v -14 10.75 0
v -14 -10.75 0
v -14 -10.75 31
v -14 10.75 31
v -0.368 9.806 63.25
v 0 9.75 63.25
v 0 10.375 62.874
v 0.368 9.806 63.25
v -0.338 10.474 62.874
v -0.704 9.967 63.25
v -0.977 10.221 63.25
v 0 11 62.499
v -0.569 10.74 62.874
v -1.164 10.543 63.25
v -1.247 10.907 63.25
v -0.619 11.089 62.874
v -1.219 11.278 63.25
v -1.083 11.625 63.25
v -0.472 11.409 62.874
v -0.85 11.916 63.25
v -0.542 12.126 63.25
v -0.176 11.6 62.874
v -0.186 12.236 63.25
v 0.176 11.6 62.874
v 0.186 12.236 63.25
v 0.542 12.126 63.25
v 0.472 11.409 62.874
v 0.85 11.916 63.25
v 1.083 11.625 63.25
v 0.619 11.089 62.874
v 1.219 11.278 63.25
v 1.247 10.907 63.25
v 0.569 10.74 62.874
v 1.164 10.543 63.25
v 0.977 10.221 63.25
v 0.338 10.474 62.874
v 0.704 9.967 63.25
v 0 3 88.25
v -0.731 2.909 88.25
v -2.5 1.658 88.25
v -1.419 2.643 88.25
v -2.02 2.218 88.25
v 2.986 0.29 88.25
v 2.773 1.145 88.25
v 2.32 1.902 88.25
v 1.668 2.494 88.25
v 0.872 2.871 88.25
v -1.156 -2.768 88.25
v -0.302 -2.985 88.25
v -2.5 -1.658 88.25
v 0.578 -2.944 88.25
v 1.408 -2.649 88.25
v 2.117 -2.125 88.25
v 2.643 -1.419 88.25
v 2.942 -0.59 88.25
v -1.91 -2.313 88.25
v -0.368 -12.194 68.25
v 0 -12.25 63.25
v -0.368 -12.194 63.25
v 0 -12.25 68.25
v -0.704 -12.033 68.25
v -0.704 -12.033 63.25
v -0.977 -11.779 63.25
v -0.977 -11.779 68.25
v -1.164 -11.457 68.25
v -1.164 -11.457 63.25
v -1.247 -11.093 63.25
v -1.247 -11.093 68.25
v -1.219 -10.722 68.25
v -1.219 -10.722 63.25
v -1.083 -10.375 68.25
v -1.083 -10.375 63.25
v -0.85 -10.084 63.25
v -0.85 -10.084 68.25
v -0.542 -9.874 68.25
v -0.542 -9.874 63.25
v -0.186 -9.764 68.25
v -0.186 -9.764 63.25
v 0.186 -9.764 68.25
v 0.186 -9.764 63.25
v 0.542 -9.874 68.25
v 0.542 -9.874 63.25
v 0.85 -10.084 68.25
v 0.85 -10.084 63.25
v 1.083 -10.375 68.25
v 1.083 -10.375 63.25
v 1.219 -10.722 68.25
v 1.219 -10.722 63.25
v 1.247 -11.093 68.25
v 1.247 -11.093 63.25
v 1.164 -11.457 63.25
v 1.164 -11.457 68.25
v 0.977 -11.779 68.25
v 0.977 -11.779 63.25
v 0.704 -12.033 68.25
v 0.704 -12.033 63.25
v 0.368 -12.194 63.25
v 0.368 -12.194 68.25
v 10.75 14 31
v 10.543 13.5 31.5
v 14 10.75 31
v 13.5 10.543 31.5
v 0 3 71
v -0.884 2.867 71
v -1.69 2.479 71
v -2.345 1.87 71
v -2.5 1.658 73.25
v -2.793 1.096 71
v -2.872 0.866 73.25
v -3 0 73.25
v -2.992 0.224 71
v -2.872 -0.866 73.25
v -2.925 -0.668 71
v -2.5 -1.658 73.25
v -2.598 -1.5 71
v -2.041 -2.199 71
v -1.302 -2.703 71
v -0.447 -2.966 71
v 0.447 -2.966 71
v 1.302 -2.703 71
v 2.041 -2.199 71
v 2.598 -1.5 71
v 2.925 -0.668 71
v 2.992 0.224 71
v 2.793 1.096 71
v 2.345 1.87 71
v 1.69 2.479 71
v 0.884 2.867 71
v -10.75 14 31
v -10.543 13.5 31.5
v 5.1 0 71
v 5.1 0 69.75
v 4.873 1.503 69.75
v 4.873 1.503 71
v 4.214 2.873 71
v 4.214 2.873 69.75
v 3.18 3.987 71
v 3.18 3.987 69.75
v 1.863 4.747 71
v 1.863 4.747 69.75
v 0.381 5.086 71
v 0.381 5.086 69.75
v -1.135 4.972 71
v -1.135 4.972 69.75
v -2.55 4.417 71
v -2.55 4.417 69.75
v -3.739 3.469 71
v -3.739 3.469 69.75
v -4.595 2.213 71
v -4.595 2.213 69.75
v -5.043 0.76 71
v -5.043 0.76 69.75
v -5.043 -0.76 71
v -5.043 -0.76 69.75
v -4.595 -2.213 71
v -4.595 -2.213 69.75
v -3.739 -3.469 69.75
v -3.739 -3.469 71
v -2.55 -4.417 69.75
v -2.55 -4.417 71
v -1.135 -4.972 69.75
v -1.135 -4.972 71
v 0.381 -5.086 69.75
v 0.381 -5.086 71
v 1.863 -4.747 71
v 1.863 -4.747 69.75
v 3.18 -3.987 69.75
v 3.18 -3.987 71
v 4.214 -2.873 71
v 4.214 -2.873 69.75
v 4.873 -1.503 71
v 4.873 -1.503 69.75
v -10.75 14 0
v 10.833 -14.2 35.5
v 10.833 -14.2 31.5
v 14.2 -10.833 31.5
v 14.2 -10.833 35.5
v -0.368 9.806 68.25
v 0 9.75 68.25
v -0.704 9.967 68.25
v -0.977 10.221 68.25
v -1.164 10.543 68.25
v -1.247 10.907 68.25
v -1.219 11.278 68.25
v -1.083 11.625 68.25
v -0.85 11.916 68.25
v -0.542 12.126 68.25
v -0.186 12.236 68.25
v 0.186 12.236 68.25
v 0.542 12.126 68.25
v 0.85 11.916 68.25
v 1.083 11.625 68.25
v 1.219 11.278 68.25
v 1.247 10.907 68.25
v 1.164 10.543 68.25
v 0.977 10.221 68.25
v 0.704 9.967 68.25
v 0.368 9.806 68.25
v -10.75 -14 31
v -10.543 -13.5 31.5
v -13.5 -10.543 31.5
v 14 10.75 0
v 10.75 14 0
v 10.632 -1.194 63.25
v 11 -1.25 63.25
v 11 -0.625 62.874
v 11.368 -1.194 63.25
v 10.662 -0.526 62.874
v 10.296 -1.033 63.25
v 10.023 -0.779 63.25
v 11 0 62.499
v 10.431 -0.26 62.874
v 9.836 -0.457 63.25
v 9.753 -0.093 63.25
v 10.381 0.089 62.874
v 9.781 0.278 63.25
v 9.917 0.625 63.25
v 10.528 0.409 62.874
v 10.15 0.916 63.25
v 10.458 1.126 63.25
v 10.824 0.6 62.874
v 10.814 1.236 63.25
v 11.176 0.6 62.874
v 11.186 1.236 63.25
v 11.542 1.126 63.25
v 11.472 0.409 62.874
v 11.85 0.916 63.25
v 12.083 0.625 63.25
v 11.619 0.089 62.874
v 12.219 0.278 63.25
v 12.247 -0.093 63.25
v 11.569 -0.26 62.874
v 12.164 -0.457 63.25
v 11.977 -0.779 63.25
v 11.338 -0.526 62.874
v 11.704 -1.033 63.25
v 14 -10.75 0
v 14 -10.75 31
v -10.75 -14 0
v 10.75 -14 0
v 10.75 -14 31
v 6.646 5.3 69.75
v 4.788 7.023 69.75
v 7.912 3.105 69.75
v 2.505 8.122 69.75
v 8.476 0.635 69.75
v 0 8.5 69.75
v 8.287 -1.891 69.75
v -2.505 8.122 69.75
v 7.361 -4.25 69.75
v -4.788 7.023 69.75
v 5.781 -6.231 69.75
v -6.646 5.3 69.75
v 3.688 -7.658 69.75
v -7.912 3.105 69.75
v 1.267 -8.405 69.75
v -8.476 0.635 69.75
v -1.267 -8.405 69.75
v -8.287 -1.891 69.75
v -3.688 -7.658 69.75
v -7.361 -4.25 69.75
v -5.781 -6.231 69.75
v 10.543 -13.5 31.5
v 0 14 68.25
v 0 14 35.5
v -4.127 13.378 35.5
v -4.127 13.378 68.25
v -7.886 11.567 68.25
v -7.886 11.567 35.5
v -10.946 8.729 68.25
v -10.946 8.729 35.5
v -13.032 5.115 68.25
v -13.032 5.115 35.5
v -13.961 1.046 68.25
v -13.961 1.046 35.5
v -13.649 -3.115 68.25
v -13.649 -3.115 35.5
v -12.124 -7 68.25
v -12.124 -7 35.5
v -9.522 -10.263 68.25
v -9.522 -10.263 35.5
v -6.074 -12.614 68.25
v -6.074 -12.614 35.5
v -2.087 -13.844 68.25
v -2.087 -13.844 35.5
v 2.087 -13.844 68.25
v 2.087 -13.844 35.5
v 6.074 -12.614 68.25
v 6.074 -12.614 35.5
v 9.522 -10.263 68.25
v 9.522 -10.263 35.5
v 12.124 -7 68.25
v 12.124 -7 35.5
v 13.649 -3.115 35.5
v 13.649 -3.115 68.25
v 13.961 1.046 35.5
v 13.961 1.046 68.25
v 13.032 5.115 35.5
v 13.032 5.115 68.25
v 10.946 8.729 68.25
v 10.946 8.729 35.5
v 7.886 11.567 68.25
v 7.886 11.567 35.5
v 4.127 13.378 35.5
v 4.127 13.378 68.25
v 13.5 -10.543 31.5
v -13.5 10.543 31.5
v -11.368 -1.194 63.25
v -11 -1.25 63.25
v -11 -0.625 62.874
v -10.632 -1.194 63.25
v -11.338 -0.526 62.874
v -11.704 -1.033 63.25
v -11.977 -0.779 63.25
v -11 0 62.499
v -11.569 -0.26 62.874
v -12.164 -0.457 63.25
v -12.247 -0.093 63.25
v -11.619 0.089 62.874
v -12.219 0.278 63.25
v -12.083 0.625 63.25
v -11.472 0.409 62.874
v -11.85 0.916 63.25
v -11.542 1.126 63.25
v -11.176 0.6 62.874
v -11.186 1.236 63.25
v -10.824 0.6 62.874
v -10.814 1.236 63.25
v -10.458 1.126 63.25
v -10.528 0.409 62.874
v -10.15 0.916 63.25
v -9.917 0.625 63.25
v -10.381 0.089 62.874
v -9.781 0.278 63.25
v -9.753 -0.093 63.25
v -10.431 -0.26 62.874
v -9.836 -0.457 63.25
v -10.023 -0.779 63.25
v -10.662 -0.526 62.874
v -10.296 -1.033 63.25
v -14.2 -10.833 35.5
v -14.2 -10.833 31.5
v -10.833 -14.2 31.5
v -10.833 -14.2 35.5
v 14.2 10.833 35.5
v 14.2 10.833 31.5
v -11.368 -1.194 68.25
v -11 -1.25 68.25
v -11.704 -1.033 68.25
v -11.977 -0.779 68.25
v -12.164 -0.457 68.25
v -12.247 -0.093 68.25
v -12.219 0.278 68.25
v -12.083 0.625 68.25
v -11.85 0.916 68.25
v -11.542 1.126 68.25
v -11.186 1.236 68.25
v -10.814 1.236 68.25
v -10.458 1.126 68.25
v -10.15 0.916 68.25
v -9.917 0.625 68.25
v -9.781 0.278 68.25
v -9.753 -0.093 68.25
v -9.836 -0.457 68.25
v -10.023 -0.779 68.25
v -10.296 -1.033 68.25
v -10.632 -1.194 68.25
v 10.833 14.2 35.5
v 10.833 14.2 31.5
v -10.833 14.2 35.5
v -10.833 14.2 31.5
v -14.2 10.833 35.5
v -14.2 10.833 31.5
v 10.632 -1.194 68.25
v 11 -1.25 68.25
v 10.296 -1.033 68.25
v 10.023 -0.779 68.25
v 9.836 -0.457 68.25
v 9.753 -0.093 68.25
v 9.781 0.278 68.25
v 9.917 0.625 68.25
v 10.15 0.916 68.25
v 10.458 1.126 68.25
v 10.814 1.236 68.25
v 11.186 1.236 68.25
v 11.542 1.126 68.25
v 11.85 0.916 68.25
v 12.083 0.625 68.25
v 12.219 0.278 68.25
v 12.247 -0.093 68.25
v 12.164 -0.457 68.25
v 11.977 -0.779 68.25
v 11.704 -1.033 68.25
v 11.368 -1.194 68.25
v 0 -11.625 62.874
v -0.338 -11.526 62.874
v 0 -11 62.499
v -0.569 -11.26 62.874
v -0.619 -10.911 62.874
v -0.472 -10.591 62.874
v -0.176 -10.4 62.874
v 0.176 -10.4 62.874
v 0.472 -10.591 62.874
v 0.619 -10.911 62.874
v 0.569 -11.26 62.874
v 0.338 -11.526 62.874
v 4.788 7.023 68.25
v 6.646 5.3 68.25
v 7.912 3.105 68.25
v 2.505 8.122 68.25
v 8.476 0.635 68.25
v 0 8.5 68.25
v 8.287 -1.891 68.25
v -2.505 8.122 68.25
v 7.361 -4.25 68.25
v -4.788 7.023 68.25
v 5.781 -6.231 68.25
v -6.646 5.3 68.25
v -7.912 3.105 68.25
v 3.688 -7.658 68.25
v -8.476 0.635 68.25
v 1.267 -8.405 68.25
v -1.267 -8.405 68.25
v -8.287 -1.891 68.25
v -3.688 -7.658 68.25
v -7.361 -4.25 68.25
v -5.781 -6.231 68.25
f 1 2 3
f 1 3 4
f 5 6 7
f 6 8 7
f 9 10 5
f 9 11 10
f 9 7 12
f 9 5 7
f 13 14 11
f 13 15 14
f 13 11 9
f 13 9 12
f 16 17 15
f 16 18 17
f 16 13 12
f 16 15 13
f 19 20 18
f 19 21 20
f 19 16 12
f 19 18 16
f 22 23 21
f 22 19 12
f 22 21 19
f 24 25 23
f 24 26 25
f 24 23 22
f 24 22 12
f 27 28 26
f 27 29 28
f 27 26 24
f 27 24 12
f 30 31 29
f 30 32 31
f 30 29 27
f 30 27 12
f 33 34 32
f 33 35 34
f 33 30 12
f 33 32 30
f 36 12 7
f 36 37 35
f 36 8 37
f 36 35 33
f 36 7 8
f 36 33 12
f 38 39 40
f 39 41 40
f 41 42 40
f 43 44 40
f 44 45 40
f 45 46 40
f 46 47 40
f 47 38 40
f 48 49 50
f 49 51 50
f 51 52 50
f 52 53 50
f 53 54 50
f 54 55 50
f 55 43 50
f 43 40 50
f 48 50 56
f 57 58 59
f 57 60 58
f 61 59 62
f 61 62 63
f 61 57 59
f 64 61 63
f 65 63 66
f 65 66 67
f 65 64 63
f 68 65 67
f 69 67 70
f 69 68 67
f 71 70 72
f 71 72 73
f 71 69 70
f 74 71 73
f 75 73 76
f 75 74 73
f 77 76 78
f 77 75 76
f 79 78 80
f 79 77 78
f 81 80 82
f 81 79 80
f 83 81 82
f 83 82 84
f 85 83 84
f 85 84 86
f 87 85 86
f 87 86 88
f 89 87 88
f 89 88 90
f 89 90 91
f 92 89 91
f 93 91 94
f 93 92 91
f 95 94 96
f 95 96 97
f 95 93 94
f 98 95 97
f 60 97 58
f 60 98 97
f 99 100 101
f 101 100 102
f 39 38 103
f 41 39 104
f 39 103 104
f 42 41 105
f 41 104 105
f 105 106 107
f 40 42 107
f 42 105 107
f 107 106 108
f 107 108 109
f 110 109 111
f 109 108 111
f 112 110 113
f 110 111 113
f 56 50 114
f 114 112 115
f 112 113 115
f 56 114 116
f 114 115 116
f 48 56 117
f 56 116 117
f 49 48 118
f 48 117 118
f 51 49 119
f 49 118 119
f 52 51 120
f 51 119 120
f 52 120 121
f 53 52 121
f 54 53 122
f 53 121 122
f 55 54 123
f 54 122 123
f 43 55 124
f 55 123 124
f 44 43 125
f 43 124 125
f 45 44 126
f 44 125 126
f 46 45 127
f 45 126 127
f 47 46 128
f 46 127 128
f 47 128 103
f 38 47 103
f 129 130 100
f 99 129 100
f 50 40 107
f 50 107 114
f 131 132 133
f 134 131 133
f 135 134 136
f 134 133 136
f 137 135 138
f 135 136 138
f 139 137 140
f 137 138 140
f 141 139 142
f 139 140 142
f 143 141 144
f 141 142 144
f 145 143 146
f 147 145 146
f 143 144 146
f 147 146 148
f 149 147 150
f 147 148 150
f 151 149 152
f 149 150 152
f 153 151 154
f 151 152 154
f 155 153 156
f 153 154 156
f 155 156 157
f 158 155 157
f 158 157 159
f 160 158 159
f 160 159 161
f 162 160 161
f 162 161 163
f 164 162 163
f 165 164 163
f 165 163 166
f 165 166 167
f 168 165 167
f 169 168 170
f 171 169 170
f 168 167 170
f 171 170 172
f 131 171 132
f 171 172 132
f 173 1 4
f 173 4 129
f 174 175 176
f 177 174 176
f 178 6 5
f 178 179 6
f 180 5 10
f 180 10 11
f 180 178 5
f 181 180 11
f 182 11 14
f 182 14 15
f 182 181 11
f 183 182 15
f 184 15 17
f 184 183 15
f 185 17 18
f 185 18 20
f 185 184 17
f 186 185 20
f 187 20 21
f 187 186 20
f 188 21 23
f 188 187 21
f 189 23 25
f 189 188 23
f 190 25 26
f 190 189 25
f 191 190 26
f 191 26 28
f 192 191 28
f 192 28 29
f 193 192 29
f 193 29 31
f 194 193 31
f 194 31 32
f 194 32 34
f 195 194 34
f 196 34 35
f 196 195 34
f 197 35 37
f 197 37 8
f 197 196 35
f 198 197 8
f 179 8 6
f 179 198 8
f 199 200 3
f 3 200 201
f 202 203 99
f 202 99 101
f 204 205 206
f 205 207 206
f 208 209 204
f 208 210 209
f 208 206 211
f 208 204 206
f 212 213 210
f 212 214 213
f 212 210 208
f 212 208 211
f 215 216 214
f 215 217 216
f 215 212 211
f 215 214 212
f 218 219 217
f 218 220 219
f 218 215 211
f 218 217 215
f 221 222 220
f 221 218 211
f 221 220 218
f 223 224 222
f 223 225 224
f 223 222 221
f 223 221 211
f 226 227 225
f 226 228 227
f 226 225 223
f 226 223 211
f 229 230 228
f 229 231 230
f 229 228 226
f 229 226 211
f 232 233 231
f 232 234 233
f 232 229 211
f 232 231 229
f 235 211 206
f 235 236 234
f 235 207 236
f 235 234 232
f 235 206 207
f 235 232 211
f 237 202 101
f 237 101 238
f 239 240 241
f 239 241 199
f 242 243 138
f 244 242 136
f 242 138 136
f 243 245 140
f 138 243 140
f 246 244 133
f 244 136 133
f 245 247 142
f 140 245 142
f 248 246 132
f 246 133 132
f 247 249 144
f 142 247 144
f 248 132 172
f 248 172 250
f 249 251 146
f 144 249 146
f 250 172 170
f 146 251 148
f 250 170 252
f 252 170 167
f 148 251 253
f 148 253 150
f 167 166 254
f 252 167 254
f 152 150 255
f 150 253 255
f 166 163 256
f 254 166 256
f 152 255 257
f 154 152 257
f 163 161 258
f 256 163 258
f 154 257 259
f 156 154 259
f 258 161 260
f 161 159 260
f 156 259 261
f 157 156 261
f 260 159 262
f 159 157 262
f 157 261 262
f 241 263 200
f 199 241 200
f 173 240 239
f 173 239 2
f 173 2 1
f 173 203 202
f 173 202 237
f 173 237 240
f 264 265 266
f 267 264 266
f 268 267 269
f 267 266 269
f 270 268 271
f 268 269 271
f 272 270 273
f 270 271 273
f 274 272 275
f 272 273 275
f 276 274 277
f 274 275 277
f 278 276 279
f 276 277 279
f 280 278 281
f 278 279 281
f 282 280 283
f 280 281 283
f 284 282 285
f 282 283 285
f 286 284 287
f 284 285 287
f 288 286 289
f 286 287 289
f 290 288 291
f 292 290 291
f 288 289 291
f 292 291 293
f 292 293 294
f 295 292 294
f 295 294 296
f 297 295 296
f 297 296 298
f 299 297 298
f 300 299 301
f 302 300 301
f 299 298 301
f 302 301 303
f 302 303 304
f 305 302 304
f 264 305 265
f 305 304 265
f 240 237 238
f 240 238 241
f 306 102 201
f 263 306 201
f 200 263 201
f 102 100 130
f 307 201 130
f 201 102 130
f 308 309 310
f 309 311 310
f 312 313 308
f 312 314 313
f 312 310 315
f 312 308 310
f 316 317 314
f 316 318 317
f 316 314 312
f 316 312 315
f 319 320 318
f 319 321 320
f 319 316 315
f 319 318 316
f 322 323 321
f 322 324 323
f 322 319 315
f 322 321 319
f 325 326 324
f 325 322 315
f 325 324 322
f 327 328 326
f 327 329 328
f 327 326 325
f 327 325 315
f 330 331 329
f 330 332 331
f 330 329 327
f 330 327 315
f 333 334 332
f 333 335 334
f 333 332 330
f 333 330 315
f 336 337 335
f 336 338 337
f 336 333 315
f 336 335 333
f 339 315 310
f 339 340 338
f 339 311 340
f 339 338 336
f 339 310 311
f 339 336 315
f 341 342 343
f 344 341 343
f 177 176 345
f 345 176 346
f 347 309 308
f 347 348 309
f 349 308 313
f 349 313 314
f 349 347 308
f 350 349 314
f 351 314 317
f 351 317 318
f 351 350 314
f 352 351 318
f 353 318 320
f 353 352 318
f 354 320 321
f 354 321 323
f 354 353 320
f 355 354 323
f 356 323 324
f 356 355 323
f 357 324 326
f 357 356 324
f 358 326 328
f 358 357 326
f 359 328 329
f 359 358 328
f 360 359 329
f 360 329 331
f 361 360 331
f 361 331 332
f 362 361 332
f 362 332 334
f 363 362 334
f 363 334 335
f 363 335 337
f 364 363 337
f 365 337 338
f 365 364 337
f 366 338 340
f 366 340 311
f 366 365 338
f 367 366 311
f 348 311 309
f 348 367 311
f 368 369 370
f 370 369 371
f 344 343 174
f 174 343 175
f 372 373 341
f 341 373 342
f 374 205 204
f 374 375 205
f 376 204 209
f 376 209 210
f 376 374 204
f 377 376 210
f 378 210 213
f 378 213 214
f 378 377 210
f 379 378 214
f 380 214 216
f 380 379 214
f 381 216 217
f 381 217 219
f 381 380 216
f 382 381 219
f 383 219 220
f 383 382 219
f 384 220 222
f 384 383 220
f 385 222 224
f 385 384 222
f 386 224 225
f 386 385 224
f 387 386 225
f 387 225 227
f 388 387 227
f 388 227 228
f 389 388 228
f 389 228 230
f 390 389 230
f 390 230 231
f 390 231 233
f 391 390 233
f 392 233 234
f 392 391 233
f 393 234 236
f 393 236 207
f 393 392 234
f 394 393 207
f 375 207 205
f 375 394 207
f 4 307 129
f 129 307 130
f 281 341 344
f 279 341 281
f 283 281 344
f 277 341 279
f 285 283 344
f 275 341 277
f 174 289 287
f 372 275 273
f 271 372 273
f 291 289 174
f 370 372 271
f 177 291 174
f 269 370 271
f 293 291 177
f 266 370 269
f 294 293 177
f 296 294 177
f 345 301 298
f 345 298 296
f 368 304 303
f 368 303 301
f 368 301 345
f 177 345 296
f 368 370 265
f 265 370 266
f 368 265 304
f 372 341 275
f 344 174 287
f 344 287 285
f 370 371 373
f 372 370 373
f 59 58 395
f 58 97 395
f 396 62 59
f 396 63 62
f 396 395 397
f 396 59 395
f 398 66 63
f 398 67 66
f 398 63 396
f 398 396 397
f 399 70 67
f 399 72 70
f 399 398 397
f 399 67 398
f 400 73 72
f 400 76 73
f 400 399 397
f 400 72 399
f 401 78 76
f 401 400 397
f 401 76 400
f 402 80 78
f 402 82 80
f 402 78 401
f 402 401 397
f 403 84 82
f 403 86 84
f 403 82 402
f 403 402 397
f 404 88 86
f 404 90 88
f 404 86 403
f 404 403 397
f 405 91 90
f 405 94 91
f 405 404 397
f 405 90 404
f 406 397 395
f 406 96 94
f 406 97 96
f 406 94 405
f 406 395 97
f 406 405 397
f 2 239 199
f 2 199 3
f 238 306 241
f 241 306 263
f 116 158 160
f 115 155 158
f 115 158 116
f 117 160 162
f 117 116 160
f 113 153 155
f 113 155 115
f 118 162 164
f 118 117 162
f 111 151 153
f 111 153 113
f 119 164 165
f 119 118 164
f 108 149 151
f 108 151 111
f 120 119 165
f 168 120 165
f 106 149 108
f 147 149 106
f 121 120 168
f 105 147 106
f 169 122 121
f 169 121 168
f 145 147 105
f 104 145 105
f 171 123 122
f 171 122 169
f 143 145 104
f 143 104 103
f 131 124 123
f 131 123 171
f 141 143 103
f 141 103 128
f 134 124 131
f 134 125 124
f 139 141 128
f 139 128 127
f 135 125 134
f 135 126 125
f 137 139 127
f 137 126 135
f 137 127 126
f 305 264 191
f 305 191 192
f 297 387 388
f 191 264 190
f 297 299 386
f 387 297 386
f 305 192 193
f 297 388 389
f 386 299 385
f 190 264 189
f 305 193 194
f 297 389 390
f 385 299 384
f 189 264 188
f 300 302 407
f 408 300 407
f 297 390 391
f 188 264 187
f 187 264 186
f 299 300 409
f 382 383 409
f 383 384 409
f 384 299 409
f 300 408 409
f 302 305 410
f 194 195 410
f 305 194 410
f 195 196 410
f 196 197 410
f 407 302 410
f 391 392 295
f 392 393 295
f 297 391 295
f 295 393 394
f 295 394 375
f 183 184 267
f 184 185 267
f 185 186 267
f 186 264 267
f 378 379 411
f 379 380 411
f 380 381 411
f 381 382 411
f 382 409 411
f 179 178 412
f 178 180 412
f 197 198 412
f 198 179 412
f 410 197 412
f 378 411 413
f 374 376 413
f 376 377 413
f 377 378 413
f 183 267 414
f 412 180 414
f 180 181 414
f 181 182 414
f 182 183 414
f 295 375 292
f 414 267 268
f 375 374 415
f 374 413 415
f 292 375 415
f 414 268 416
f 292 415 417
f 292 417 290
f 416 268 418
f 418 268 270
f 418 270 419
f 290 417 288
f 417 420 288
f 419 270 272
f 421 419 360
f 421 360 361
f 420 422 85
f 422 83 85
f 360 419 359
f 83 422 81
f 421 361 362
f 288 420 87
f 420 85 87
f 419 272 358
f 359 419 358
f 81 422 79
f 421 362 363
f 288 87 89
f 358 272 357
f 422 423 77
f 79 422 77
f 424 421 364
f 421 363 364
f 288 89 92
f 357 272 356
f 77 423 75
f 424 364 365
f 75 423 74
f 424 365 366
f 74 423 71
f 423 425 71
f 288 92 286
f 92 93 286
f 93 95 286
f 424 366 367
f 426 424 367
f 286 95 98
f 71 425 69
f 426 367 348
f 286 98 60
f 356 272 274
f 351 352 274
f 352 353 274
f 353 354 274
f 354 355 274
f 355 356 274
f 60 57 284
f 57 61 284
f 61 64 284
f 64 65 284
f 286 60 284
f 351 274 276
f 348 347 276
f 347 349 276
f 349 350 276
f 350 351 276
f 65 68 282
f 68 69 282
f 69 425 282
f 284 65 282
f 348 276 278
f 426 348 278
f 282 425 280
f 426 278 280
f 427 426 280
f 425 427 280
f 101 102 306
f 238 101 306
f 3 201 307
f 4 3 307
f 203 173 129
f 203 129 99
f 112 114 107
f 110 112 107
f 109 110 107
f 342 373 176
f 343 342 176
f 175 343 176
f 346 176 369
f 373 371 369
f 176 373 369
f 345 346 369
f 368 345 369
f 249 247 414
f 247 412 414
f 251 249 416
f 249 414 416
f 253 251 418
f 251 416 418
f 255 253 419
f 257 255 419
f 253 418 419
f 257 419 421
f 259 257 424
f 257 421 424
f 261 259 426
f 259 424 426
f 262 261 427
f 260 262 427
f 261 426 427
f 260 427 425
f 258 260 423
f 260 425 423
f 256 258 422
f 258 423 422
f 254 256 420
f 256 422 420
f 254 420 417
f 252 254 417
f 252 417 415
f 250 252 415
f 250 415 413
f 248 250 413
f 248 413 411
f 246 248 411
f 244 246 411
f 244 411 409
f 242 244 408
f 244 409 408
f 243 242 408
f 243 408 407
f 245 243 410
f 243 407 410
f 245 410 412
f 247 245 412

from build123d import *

# Parameters (mm, degrees)
BOSS_EXTRUDE1_DEPTH            = 31.5
BOSS_EXTRUDE2_DEPTH            = 4
CHAMFER1_SIZE                  = 0.5
M3X0_5_TAPPED_HOLE1_AT_2_COUNT = 2
M3X0_5_TAPPED_HOLE1_AT_2_PITCH = 15.556349186
M3X0_5_TAPPED_HOLE1_AT_3_COUNT = 2
M3X0_5_TAPPED_HOLE1_AT_3_PITCH = 22
M3X0_5_TAPPED_HOLE1_AT_4_COUNT = 2
M3X0_5_TAPPED_HOLE1_AT_4_PITCH = 15.556349186
SKETCH8_R                      = 5.1
SKETCH8_R_2                    = 3
BOSS_EXTRUDE3_DEPTH            = 1.25
CUT_EXTRUDE1_DEPTH             = 15
MOVE_START                     = 31.5
MOVE_FACE1_DEPTH               = 4


# Read off the part's stored shape, not the designer's step: Move Face1
with BuildPart() as part:
    # Sketch1 → Boss-Extrude1 (new body)
    with BuildSketch(Plane.XY):
        Polygon((10.75, -14), (-10.75, -14), (-14, -10.75), (-14, 10.75), (-10.75, 14), (10.75, 14), (14, 10.75), (14, -10.75), align=None)
    extrude(amount=BOSS_EXTRUDE1_DEPTH)

    # Chamfer1
    chamfer1_edges = [part.edges().sort_by_distance(p)[0] for p in [
        (-12.375, 12.375, 31.5),
        (-14, 0, 31.5),
        (-12.375, -12.375, 31.5),
        (0, -14, 31.5),
        (12.375, -12.375, 31.5),
        (14, 0, 31.5),
        (12.375, 12.375, 31.5),
        (0, 14, 31.5),
    ]]
    chamfer(chamfer1_edges, length=CHAMFER1_SIZE)


with BuildPart() as body_2:
    # Sketch3 → Boss-Extrude2 (new body)
    with BuildSketch(Plane.XY.offset(31.5)):
        Polygon((14, 10.75), (10.75, 14), (-10.75, 14), (-14, 10.75), (-14, -10.75), (-10.75, -14), (10.75, -14), (14, -10.75), align=None)
    extrude(amount=BOSS_EXTRUDE2_DEPTH)

    # Sketch4 → Revolve1 (revolve)
    with BuildSketch(Plane(origin=(0, 0, 0), x_dir=(0, 0, -1), z_dir=(1, 0, 0))):
        Polygon((-88.25, 0), (-88.25, 3), (-69.75, 3), (-69.75, 8.5), (-68.25, 8.5), (-68.25, 14), (-35.5, 14), (-35.5, 0), align=None)
    revolve(axis=Axis((0, 0, 35.5), (0, 0, 1)))

    # Sketch7 → M3x0.5 Tapped Hole1 (revolve, cut)
    with BuildSketch(Plane(origin=(0, 11, 68.25), x_dir=(0, -1, 0), z_dir=(1, 0, 0))):
        Polygon((0, 0), (0, 5.751075774), (1.25, 5), (1.25, 0), align=None)
    m3x0_5_tapped_hole1 = revolve(axis=Axis((0, 11, 74.6), (0, 0, -1)), mode=Mode.SUBTRACT)

    # M3x0.5 Tapped Hole1 at 2: M3x0.5 Tapped Hole1 ×2
    with Locations(*[Vector(0.7071067811865472, -0.7071067811865478, 0) * (i * M3X0_5_TAPPED_HOLE1_AT_2_PITCH) for i in range(1, M3X0_5_TAPPED_HOLE1_AT_2_COUNT)]):
        add(m3x0_5_tapped_hole1, mode=Mode.SUBTRACT)

    # M3x0.5 Tapped Hole1 at 3: M3x0.5 Tapped Hole1 ×2
    with Locations(*[(0, -i * M3X0_5_TAPPED_HOLE1_AT_3_PITCH, 0) for i in range(1, M3X0_5_TAPPED_HOLE1_AT_3_COUNT)]):
        add(m3x0_5_tapped_hole1, mode=Mode.SUBTRACT)

    # M3x0.5 Tapped Hole1 at 4: M3x0.5 Tapped Hole1 ×2
    with Locations(*[Vector(-0.7071067811865472, -0.7071067811865478, 0) * (i * M3X0_5_TAPPED_HOLE1_AT_4_PITCH) for i in range(1, M3X0_5_TAPPED_HOLE1_AT_4_COUNT)]):
        add(m3x0_5_tapped_hole1, mode=Mode.SUBTRACT)

    # Sketch8 → Boss-Extrude3 (add)
    with BuildSketch(Plane.XY.offset(69.75)):
        Circle(SKETCH8_R)
        with Locations(Location((0, 0, 0), (0, 0, 90))):
            Circle(SKETCH8_R_2, mode=Mode.SUBTRACT)
    extrude(amount=BOSS_EXTRUDE3_DEPTH)

    # Sketch9 → Cut-Extrude1 (cut)
    with BuildSketch(Plane.XY.offset(88.25)):
        with BuildLine():
            Line((-2.5, 1.658312395), (-2.5, -1.658312395))
            ThreePointArc((-2.5, -1.658312395), (-3, 0), (-2.5, 1.658312395))
        make_face()
    extrude(amount=-CUT_EXTRUDE1_DEPTH, mode=Mode.SUBTRACT)

    # Move Face1 outline → Move Face1 (add)
    with BuildSketch(Plane.XY.offset(MOVE_START)):
        Polygon((14.2, -10.832842712), (14.2, 10.832842712), (10.832842712, 14.2), (-10.832842712, 14.2), (-14.2, 10.832842712), (-14.2, -10.832842712), (-10.832842712, -14.2), (10.832842712, -14.2), align=None)
        Polygon((10.75, 14), (14, 10.75), (14, -10.75), (10.75, -14), (-10.75, -14), (-14, -10.75), (-14, 10.75), (-10.75, 14), align=None, mode=Mode.SUBTRACT)
    extrude(amount=MOVE_FACE1_DEPTH)


solid = Compound([part.part, body_2.part])
